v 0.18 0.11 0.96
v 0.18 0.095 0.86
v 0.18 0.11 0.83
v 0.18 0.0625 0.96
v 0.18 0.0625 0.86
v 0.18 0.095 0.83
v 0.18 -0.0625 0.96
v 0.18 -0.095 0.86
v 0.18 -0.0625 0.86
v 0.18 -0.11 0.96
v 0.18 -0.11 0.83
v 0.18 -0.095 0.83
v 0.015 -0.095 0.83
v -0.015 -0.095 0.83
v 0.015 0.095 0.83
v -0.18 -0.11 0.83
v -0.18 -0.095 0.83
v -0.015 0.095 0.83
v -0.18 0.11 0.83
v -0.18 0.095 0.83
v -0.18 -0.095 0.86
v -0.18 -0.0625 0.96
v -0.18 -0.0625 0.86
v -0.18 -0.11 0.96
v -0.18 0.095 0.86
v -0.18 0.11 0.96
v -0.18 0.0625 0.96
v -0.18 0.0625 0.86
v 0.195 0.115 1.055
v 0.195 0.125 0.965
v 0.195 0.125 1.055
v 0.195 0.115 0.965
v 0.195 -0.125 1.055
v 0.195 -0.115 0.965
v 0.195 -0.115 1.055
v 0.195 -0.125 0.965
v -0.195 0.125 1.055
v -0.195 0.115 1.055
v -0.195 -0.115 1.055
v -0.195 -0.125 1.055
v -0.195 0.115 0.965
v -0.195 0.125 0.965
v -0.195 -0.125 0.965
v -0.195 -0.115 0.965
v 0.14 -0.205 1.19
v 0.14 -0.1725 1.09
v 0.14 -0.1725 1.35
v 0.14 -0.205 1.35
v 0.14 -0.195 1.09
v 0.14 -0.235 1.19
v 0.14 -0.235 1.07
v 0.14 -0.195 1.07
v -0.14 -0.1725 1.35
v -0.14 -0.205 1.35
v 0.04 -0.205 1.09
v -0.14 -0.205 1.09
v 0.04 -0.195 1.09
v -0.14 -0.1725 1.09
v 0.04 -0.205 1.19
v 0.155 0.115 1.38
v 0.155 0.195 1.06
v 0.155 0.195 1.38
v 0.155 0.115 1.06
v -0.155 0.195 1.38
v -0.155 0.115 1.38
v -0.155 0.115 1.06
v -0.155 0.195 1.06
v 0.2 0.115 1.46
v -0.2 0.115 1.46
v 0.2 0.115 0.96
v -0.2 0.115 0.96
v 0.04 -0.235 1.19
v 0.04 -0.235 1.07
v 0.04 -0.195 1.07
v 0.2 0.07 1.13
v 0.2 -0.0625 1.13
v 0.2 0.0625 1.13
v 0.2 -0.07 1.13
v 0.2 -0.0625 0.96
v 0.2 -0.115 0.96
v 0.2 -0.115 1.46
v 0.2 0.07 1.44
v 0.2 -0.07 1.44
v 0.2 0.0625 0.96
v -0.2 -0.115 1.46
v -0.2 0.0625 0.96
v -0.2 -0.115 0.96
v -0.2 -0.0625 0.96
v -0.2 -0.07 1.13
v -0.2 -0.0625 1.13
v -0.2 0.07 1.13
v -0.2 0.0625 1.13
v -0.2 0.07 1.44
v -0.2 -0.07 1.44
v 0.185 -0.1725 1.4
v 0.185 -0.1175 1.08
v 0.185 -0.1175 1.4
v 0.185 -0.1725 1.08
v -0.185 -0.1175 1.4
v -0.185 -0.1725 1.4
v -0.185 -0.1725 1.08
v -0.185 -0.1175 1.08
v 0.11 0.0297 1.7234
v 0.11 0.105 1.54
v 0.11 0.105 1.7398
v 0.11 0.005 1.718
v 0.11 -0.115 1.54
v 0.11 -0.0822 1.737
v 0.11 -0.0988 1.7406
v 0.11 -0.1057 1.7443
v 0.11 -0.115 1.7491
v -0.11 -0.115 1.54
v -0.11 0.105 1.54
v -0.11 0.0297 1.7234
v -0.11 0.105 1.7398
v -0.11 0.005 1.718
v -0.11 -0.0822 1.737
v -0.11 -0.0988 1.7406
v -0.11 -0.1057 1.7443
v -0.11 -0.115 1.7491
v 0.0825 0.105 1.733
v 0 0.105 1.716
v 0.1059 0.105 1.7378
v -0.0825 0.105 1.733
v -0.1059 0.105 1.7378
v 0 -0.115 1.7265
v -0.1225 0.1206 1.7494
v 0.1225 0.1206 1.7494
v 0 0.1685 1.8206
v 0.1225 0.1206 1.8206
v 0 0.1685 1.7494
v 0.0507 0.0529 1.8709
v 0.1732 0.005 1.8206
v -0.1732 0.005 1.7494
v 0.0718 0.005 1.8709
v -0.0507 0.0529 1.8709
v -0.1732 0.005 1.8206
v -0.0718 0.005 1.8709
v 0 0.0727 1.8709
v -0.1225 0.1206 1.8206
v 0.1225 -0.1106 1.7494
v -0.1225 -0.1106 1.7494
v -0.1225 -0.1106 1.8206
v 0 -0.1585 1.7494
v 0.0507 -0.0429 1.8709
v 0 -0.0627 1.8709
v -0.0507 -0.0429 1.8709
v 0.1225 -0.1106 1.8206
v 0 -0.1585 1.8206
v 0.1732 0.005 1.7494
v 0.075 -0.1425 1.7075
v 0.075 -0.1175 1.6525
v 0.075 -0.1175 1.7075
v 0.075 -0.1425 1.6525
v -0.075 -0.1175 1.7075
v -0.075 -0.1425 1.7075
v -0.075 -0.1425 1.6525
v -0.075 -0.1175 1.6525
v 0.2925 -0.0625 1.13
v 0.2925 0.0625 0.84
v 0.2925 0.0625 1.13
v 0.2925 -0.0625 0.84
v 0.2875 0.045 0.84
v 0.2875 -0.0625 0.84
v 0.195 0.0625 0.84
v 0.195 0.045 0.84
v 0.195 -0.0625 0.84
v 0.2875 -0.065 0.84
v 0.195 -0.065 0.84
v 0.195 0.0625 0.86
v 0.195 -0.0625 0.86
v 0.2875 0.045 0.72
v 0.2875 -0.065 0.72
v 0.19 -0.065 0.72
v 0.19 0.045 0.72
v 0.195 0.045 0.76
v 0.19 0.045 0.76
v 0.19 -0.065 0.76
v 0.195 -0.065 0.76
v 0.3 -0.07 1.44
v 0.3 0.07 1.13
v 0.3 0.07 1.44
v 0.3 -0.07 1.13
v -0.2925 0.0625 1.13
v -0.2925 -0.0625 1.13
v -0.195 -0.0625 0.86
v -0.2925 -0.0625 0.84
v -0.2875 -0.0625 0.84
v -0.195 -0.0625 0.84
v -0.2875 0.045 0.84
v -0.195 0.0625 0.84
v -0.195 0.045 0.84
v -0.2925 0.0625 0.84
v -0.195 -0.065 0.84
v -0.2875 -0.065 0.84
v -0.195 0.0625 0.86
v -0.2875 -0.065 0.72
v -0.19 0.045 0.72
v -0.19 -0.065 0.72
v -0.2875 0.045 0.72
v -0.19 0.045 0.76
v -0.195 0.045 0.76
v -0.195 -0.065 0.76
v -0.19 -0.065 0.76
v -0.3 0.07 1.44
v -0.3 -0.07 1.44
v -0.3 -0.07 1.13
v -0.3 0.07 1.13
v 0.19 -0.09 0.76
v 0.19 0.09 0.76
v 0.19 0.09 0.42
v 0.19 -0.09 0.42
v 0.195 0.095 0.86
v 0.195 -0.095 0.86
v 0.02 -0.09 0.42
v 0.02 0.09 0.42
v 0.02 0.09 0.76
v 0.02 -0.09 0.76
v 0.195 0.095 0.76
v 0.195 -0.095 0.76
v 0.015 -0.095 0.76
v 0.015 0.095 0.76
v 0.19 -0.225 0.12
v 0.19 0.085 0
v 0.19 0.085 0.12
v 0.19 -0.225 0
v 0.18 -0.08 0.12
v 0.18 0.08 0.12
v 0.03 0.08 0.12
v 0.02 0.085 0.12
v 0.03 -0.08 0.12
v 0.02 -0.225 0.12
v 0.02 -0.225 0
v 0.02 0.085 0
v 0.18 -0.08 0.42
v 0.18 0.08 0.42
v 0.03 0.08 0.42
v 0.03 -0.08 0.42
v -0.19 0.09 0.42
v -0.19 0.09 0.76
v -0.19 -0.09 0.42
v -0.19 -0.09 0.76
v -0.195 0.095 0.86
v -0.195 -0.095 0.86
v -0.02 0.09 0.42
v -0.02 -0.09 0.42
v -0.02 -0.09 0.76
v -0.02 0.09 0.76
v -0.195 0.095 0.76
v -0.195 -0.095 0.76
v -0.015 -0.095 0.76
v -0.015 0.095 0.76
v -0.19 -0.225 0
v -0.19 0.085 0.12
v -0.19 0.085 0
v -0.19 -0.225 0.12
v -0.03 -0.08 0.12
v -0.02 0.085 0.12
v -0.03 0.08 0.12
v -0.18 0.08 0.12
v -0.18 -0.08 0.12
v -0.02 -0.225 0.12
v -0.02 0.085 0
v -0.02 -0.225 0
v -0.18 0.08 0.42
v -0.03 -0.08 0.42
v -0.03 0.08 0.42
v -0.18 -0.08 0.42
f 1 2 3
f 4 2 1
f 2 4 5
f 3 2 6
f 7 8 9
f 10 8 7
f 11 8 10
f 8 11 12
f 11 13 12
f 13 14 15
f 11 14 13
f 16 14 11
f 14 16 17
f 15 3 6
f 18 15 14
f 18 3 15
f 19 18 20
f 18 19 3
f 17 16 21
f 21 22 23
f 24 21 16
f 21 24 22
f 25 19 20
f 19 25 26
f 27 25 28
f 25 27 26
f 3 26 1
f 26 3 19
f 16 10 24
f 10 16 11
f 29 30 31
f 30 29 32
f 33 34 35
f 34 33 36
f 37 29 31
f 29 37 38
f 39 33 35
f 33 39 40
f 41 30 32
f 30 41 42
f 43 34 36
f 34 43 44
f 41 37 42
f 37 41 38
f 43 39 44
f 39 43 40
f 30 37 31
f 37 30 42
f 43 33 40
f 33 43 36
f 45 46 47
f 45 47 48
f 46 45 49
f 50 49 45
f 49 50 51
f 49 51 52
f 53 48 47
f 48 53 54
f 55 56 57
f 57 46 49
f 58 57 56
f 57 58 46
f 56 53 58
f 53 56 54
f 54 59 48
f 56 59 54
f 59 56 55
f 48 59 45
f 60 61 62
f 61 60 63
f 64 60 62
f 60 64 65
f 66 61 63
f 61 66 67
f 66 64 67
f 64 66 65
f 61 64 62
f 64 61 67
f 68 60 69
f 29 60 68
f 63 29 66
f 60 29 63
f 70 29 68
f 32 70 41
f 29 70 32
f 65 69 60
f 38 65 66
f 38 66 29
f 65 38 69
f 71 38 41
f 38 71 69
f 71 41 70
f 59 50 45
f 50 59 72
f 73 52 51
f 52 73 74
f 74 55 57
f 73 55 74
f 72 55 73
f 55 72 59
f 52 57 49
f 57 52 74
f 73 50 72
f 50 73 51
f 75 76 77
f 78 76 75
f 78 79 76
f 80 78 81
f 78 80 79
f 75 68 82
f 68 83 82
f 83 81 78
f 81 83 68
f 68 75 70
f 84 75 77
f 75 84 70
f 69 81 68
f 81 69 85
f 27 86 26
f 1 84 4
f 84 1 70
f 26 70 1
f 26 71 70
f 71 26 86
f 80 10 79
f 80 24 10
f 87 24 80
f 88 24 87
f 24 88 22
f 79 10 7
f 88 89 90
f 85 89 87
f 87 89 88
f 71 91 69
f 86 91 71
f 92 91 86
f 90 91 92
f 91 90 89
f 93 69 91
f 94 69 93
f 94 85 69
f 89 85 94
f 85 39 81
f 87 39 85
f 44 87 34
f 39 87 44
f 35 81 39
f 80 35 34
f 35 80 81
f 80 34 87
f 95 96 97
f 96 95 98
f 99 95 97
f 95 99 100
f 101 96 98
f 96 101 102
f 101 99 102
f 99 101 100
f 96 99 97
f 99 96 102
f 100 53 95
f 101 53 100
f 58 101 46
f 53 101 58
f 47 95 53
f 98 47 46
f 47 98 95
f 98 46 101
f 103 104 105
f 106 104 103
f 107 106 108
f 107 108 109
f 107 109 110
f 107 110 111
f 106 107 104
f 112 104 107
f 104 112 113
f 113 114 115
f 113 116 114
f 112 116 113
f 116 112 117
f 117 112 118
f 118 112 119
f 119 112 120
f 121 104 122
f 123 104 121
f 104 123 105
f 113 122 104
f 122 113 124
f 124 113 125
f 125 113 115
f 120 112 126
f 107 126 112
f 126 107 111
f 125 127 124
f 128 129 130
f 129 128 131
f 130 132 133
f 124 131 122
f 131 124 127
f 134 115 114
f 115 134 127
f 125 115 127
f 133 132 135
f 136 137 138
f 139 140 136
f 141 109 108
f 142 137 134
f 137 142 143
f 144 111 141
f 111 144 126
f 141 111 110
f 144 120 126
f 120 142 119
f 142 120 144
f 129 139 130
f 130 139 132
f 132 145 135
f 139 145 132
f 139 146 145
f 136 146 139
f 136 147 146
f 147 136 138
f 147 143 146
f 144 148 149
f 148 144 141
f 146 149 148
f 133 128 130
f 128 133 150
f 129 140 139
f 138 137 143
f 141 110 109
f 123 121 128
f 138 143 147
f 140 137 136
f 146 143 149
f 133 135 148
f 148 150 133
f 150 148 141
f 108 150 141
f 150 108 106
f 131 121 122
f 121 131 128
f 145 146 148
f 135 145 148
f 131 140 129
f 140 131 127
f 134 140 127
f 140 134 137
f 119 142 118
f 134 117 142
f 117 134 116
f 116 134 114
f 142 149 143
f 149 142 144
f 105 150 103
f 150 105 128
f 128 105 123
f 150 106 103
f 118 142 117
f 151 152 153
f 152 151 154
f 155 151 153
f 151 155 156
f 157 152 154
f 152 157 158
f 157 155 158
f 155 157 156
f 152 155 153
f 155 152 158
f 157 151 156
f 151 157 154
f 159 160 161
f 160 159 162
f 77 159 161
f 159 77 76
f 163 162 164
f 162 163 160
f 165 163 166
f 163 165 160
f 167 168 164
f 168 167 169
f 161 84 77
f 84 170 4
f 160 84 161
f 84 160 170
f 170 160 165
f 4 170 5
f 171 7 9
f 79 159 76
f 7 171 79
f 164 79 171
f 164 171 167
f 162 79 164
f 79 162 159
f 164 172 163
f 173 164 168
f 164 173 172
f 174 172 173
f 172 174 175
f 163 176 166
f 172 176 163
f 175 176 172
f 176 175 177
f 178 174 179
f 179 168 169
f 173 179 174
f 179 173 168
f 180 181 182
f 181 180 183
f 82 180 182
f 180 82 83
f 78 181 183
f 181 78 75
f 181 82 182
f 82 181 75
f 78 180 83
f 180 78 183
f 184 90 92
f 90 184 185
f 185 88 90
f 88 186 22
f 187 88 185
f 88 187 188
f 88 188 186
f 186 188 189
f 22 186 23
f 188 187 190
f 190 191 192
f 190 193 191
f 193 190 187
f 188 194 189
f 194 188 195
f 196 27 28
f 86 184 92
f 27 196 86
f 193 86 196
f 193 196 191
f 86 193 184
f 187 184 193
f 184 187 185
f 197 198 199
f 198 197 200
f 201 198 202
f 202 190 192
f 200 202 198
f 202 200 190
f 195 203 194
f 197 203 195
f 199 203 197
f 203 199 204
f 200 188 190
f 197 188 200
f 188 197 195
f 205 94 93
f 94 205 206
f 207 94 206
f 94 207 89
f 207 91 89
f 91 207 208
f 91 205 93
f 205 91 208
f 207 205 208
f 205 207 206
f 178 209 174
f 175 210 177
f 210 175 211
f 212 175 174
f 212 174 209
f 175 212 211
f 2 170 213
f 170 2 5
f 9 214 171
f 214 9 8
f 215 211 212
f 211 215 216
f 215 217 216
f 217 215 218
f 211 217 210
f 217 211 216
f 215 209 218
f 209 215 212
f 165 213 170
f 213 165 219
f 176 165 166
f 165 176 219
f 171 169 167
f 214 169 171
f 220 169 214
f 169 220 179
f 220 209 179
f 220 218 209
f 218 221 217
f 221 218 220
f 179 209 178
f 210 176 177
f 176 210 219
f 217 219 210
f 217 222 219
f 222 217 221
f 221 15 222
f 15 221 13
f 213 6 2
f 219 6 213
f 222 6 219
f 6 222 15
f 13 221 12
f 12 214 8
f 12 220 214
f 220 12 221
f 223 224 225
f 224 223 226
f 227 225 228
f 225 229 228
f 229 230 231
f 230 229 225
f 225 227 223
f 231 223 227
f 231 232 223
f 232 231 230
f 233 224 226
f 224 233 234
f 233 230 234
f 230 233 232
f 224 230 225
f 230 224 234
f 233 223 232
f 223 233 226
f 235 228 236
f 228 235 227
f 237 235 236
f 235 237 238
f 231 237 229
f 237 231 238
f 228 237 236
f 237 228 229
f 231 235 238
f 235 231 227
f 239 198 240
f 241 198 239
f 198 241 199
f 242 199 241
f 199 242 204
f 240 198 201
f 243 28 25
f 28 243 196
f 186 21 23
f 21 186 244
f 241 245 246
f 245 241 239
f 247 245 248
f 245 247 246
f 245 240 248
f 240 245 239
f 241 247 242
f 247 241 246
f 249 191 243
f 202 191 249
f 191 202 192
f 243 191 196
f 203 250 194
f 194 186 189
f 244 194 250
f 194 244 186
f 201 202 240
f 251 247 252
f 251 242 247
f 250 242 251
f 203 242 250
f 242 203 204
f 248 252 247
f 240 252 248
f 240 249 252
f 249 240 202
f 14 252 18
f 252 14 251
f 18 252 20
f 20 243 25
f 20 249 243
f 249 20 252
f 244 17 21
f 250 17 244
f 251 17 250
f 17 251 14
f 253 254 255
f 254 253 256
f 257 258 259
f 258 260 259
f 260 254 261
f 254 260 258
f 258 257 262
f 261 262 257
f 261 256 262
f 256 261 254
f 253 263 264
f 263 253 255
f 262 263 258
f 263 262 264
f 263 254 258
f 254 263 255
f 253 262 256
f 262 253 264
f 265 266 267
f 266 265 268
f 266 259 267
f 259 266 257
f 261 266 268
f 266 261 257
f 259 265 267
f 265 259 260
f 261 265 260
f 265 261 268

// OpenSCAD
// ============================================================================
// nextdayz_survivor.scad - Articulated rigid-body player for NextDayz 3C.
//
// ScadRig: 1 unit = 1 metre, Z-up, faces -Y, bone_root at ground. The
// character's RIGHT side is -X: the _r bones (firing hand, rear foot) sit at
// -X so the rifle shoulders on the same side the over-the-shoulder camera
// looks past.
//
// Every clip below is generated by rig_humanoid.scad from intent, not typed in
// as joint angles: gaits from cadence / speed / duty / bob / sway with the
// boots IK-planted on z = 0, weapon holds from a weapon frame in chest space
// with both arms IK-solved onto the grip and handguard. Tune the numbers in
// the dictionaries; the loader still sees ordinary anim_* data.
//
// Runtime contract (NextDayz PlayerRigVisual):
//   bone_ik_weapon      weapon frame (muzzle -Y), child of the torso. Hold
//                       clips animate it; the game re-solves the arms onto it
//                       every frame after adding aim pitch, sway and recoil.
//   bone_ik_hand_r/l    wrist frames on the grip / handguard (weapon space).
//   bone_weapon_socket  weapon attachment under the right hand; its bind is
//                       the inverse of the right grip, so a hand solved onto
//                       bone_ik_hand_r puts the weapon exactly on the frame.
// Locomotion is in-place; the Jolt character controller owns translation.
// ============================================================================

use <../lib/rig_humanoid.scad>

$fn = 8;

ROLECOLOR = [1.00, 0.00, 1.00];
UNIFORM   = [0.22, 0.25, 0.22];
VEST      = [0.12, 0.14, 0.12];
SKIN      = [0.72, 0.52, 0.38];
BOOT      = [0.07, 0.065, 0.06];
METAL     = [0.18, 0.19, 0.18];

// --- Skeleton ----------------------------------------------------------------
// Must match the bone_* translations below; the clip generators read it.

SKEL = rh_skeleton([
    ["pelvis_z", 0.94],
    ["hip", [0.105, 0, -0.08]],
    ["thigh", 0.44],
    ["calf", 0.42],
    ["heel", 0.085],
    ["ball", 0.21],
    ["torso_z", 0.02],
    ["shoulder", [0.235, 0, 0.48]],
    ["upperarm", 0.31],
    ["forearm", 0.29]
]);

// --- Weapon hold ---------------------------------------------------------------
// Weapon frame = the weapon model origin; muzzle -Y, top +Z. The rifle stock
// butt sits STOCK behind it. Holds are built from the shoulder pocket so the
// butt stays in the firing-side shoulder whatever the blade and pitch.

POCKET = [-0.14, -0.12, 0.42];
STOCK  = 0.34;

// Right wrist on the grip (inverse of the socket below) and left wrist under
// the handguard, both in weapon space.
GRIP_R = [[0, 0.0837, 0.0547], [-20, 0, 0]];
GRIP_L = [[0.045, -0.20, -0.075], [-160, -30, 0]];

// blade: torso yaw away from the target (right shoulder back), cancelled in
// the weapon frame so the muzzle stays on the body axis. pitch: + = muzzle down.
function nd_shoulder_hold(blade, pitch, pocket = POCKET, inward = 5) =
    let(e = [pitch, 0, blade + inward])
    [pocket - rh_mv(rh_m(e), [0, STOCK, 0]), e];

READY_BLADE = 20;
AIM_BLADE   = 30;
HOLD_READY  = nd_shoulder_hold(READY_BLADE, 14);
HOLD_AIM    = nd_shoulder_hold(AIM_BLADE, 0, [-0.13, -0.12, 0.47]);
HOLD_UP     = nd_shoulder_hold(AIM_BLADE, -38, [-0.13, -0.11, 0.48]);
HOLD_DOWN   = nd_shoulder_hold(AIM_BLADE, 38, [-0.13, -0.14, 0.44]);
// Sprint: rifle across the chest, muzzle up toward the support shoulder.
HOLD_SPRINT = [[0.0, -0.30, 0.30], [-50, 0, 45]];
// Lowered to the firing side, muzzle down (switching, traversal, looting).
HOLD_LOW    = [[-0.24, -0.22, 0.14], [68, 0, -18]];

RIG = [
    ["weapon_bind", HOLD_READY],
    ["grip_r", GRIP_R],
    ["grip_l", GRIP_L],
    ["pole_r", [-0.50, 0.08, 0.12]],
    ["pole_l", [0.45, -0.15, 0.08]]
];

// --- Parts -------------------------------------------------------------------

module part_pelvis()
{
    color(UNIFORM) cube([0.36, 0.22, 0.22], center = true);
    color(VEST) translate([0, 0, 0.07]) cube([0.39, 0.25, 0.09], center = true);
}

module part_torso()
{
    color(UNIFORM) translate([0, 0, 0.25]) cube([0.40, 0.23, 0.50], center = true);
    color(ROLECOLOR) translate([0, -0.145, 0.28]) cube([0.37, 0.055, 0.32], center = true);
    color(VEST)
    {
        translate([0, -0.18, 0.26]) cube([0.28, 0.05, 0.26], center = true);
        translate([0, 0.155, 0.26]) cube([0.31, 0.08, 0.32], center = true);
        // Magazine pouches on the support side of the plate carrier.
        translate([0.09, -0.215, 0.17]) cube([0.10, 0.04, 0.12], center = true);
    }
}

module part_head()
{
    color(SKIN) translate([0, -0.005, 0.12]) cube([0.22, 0.22, 0.24], center = true);
    color(ROLECOLOR) translate([0, 0.005, 0.245]) scale([1.25, 1.18, 0.62]) sphere(r = 0.15);
    color(METAL) translate([0, -0.13, 0.14]) cube([0.15, 0.025, 0.055], center = true);
}

module part_upperarm()
{
    color(ROLECOLOR) translate([0, 0, -0.155]) cube([0.13, 0.14, 0.31], center = true);
}

module part_forearm()
{
    color(UNIFORM) translate([0, 0, -0.145]) cube([0.115, 0.125, 0.29], center = true);
}

module part_hand()
{
    color(SKIN) translate([0, -0.01, -0.06]) cube([0.105, 0.11, 0.12], center = true);
}

module part_thigh()
{
    color(UNIFORM) translate([0, 0, -0.22]) cube([0.17, 0.18, 0.44], center = true);
    color(VEST) translate([0, 0, -0.05]) cube([0.18, 0.19, 0.10], center = true);
}

module part_calf()
{
    color(UNIFORM) translate([0, 0, -0.21]) cube([0.15, 0.16, 0.42], center = true);
}

module part_foot()
{
    color(BOOT) translate([0, -0.07, 0.06]) cube([0.17, 0.31, 0.12], center = true);
    color(ROLECOLOR) translate([0, -0.20, 0.07]) cube([0.11, 0.045, 0.06], center = true);
}

// --- Bones -------------------------------------------------------------------

module bone_weapon_socket()
{
    // Empty on purpose: the runtime weapon hangs here. Local -Y is the muzzle.
}

module bone_ik_hand_r() {}
module bone_ik_hand_l() {}

module bone_ik_weapon()
{
    translate(GRIP_R[0]) rotate(GRIP_R[1]) bone_ik_hand_r();
    translate(GRIP_L[0]) rotate(GRIP_L[1]) bone_ik_hand_l();
}

module bone_hand_l() { part_hand(); }
module bone_hand_r()
{
    mirror([1, 0, 0]) part_hand();
    translate([0, -0.06, -0.08]) rotate([20, 0, 0]) bone_weapon_socket();
}

module bone_forearm_l()
{
    part_forearm();
    translate([0, 0, -0.29]) bone_hand_l();
}
module bone_forearm_r()
{
    mirror([1, 0, 0]) part_forearm();
    translate([0, 0, -0.29]) bone_hand_r();
}

module bone_upperarm_l()
{
    part_upperarm();
    translate([0, 0, -0.31]) bone_forearm_l();
}
module bone_upperarm_r()
{
    mirror([1, 0, 0]) part_upperarm();
    translate([0, 0, -0.31]) bone_forearm_r();
}

module bone_head() { part_head(); }

module bone_torso()
{
    part_torso();
    translate([0, 0, 0.58]) bone_head();
    translate([ 0.235, 0, 0.48]) bone_upperarm_l();
    translate([-0.235, 0, 0.48]) bone_upperarm_r();
    translate(HOLD_READY[0]) rotate(HOLD_READY[1]) bone_ik_weapon();
}

module bone_foot_l() { part_foot(); }
module bone_foot_r() { mirror([1, 0, 0]) part_foot(); }

module bone_calf_l()
{
    part_calf();
    translate([0, 0, -0.42]) bone_foot_l();
}
module bone_calf_r()
{
    mirror([1, 0, 0]) part_calf();
    translate([0, 0, -0.42]) bone_foot_r();
}

module bone_thigh_l()
{
    part_thigh();
    translate([0, 0, -0.44]) bone_calf_l();
}
module bone_thigh_r()
{
    mirror([1, 0, 0]) part_thigh();
    translate([0, 0, -0.44]) bone_calf_r();
}

module bone_pelvis()
{
    part_pelvis();
    translate([0, 0, 0.02]) bone_torso();
    translate([ 0.105, 0, -0.08]) bone_thigh_l();
    translate([-0.105, 0, -0.08]) bone_thigh_r();
}

module bone_root()
{
    translate([0, 0, 0.94]) bone_pelvis();
}

bone_root();

// --- Gaits ---------------------------------------------------------------------
// cycle/speed/duty fix the stride (stance sweep = speed * duty * cycle); the
// rest is body language. stride_bias shifts the sweep back so the boot lands
// under the knee and toes off far behind, as a real stride does.

GAIT_COMMON = [
    ["keys", 32], ["head_level", 0.85], ["gaze_pitch", -2]
];

GAIT_WALK = rh_gait_params(concat(GAIT_COMMON, [
    ["cycle", 0.84], ["speed", 1.8], ["duty", 0.60], ["stride_bias", 0.08],
    ["step_height", 0.09], ["lift_skew", 0.85], ["swing_tangent", 0.25], ["swing_out", 0.02],
    ["heel_strike", 14], ["heel_until", 0.18], ["toe_off", 42], ["toe_from", 0.55], ["swing_pitch", 14],
    ["width", 0.11], ["pelvis", [0, 0, -0.075]], ["bob", 0.016], ["bob_sign", 1], ["sway", 0.022],
    ["hip_pitch", 3], ["hip_yaw", 6], ["hip_roll", 3], ["strafe_turn", 35],
    ["torso_lean", 4], ["torso_bounce", 0.8], ["torso_counter", 1.3], ["strafe_lean", 3],
    ["arm_base", 6], ["arm_swing", 18], ["arm_out", 6], ["elbow_base", 20], ["elbow_swing", 15]
]));

GAIT_RUN = rh_gait_params(concat(GAIT_COMMON, [
    ["cycle", 0.68], ["speed", 4.2], ["duty", 0.33], ["stride_bias", 0.12],
    ["step_height", 0.17], ["lift_skew", 0.6], ["swing_tangent", 0.35], ["swing_out", 0.02],
    ["heel_strike", 6], ["heel_until", 0.10], ["toe_off", 58], ["toe_from", 0.45], ["swing_pitch", 35],
    ["width", 0.09], ["pelvis", [0, -0.02, -0.10]], ["bob", 0.032], ["bob_sign", -1], ["sway", 0.012],
    ["hip_pitch", 6], ["hip_yaw", 9], ["hip_roll", 4], ["strafe_turn", 45],
    ["torso_lean", 7], ["torso_bounce", 2], ["torso_counter", 1.3], ["strafe_lean", 6],
    ["arm_base", 10], ["arm_swing", 35], ["arm_out", 8], ["elbow_base", 75], ["elbow_swing", 25]
]));

GAIT_SPRINT = rh_gait_params(concat(GAIT_COMMON, [
    ["cycle", 0.58], ["speed", 7.6], ["duty", 0.24], ["stride_bias", 0.15],
    ["step_height", 0.24], ["lift_skew", 0.55], ["swing_tangent", 0.40], ["swing_out", 0.01],
    ["heel_strike", 0], ["heel_until", 0], ["toe_off", 62], ["toe_from", 0.40], ["swing_pitch", 45],
    ["width", 0.07], ["pelvis", [0, -0.04, -0.11]], ["bob", 0.04], ["bob_sign", -1], ["sway", 0.008],
    ["hip_pitch", 10], ["hip_yaw", 12], ["hip_roll", 3], ["strafe_turn", 50],
    ["torso_lean", 14], ["torso_bounce", 2.5], ["torso_counter", 1.3], ["strafe_lean", 8],
    ["arm_base", 12], ["arm_swing", 55], ["arm_out", 6], ["elbow_base", 90], ["elbow_swing", 20]
]));

GAIT_CROUCH = rh_gait_params(concat(GAIT_COMMON, [
    ["cycle", 0.80], ["speed", 1.55], ["duty", 0.62], ["stride_bias", 0.05],
    ["step_height", 0.07], ["lift_skew", 0.9], ["swing_tangent", 0.2], ["swing_out", 0.03],
    ["heel_strike", 8], ["heel_until", 0.15], ["toe_off", 35], ["toe_from", 0.6], ["swing_pitch", 10],
    ["width", 0.14], ["pelvis", [0, 0.08, -0.33]], ["bob", 0.012], ["bob_sign", 1], ["sway", 0.03],
    ["hip_pitch", 12], ["hip_yaw", 5], ["hip_roll", 2], ["strafe_turn", 35],
    ["torso_lean", 14], ["torso_bounce", 0.6], ["torso_counter", 1.3], ["strafe_lean", 3],
    ["arm_base", 18], ["arm_swing", 10], ["arm_out", 10], ["elbow_base", 45], ["elbow_swing", 10]
]));

anim_stand_walk_f = rh_gait_clip(SKEL, GAIT_WALK, 0);
anim_stand_walk_b = rh_gait_clip(SKEL, GAIT_WALK, 180);
anim_stand_walk_l = rh_gait_clip(SKEL, GAIT_WALK, 90);
anim_stand_walk_r = rh_gait_clip(SKEL, GAIT_WALK, -90);

anim_stand_run_f = rh_gait_clip(SKEL, GAIT_RUN, 0);
anim_stand_run_b = rh_gait_clip(SKEL, GAIT_RUN, 180);
anim_stand_run_l = rh_gait_clip(SKEL, GAIT_RUN, 90);
anim_stand_run_r = rh_gait_clip(SKEL, GAIT_RUN, -90);

anim_stand_sprint_f = rh_gait_clip(SKEL, GAIT_SPRINT, 0);
anim_stand_sprint_b = rh_gait_clip(SKEL, GAIT_SPRINT, 180);
anim_stand_sprint_l = rh_gait_clip(SKEL, GAIT_SPRINT, 90);
anim_stand_sprint_r = rh_gait_clip(SKEL, GAIT_SPRINT, -90);

anim_crouch_walk_f = rh_gait_clip(SKEL, GAIT_CROUCH, 0);
anim_crouch_walk_b = rh_gait_clip(SKEL, GAIT_CROUCH, 180);
anim_crouch_walk_l = rh_gait_clip(SKEL, GAIT_CROUCH, 90);
anim_crouch_walk_r = rh_gait_clip(SKEL, GAIT_CROUCH, -90);

// --- Stances -------------------------------------------------------------------
// Staggered fighting stance: support foot forward, firing foot back and turned
// out, knees soft, weight forward. A slow breath keeps it alive.

function nd_level_head(pelvisRot, torsoRot, gaze = [-2, 0, 0]) =
    [gaze[0] - (pelvisRot[0] + torsoRot[0]) * 0.85,
     gaze[1] - (pelvisRot[1] + torsoRot[1]) * 0.85,
     gaze[2] - (pelvisRot[2] + torsoRot[2]) * 0.85];

function nd_breath_key(base, phase, depth) =
    let(b = sin(360 * phase),
        pelvisPos = rh_get(base, "pelvis") + [0, 0, -0.006 * b * depth],
        pelvisRot = rh_get(base, "pelvis_rot"),
        torsoRot = rh_get(base, "torso") + [1.2 * b * depth, 0, 0.4 * b * depth])
    concat([["pelvis", pelvisPos], ["pelvis_rot", pelvisRot], ["torso", torsoRot],
            ["head", nd_level_head(pelvisRot, torsoRot)]], base);

function nd_breath_clip(base, cycle, depth) =
    rh_clip_from_poses(concat(rh_lower_bones(), [["bone_torso", "rot"], ["bone_head", "rot"]],
                              [["bone_upperarm_l", "rot"], ["bone_forearm_l", "rot"],
                               ["bone_upperarm_r", "rot"], ["bone_forearm_r", "rot"]]),
                       [for (i = [0 : 8]) cycle * i / 8],
                       [for (i = [0 : 8])
                           let(key = nd_breath_key(base, i / 8, depth))
                           concat(rh_lower_pose(SKEL, key), [rh_get(key, "torso"), rh_get(key, "head")],
                                  rh_get(base, "arms"))],
                       true);

STAND_BASE = [
    ["pelvis", [0, 0.02, -0.06]], ["pelvis_rot", [3, 0, -10]], ["torso", [5, 0, 8]],
    ["foot_l", [0.13, -0.08, 12, 0]], ["foot_r", [-0.15, 0.17, -28, 0]],
    ["arms", [[-8, -6, 0], [-22, 0, 0], [-6, 6, 0], [-18, 0, 0]]]
];

CROUCH_BASE = [
    ["pelvis", [0, 0.10, -0.40]], ["pelvis_rot", [10, 0, -12]], ["torso", [20, 0, 10]],
    ["foot_l", [0.14, -0.22, 14, 0]], ["foot_r", [-0.16, 0.20, -26, 42]],
    ["arms", [[-24, -10, 0], [-48, 0, 0], [-20, 10, 0], [-46, 0, 0]]]
];

anim_stand_idle  = nd_breath_clip(STAND_BASE, 3.2, 1.0);
anim_crouch_idle = nd_breath_clip(CROUCH_BASE, 2.8, 0.8);

// --- Weapon holds (upper body) -------------------------------------------------
// Torso/head carry the blade; layered additively over locomotion at runtime.

function nd_hold(weapon, blade, extra = []) =
    concat(extra, [["weapon", weapon], ["torso", [0, 0, -blade]], ["head", [0, 0, blade * 0.9]]]);

anim_weapon_ready     = rh_upper_clip(SKEL, RIG, [[0, nd_hold(HOLD_READY, READY_BLADE)]], true);
anim_aim_rifle_center = rh_upper_clip(SKEL, RIG, [[0, nd_hold(HOLD_AIM, AIM_BLADE,
                                                       [["head", [6, -8, AIM_BLADE * 0.9]]])]], true);
anim_aim_rifle_up     = rh_upper_clip(SKEL, RIG, [[0, nd_hold(HOLD_UP, AIM_BLADE,
                                                       [["torso", [-10, 0, -AIM_BLADE]],
                                                        ["head", [-14, -8, AIM_BLADE * 0.9]]])]], true);
anim_aim_rifle_down   = rh_upper_clip(SKEL, RIG, [[0, nd_hold(HOLD_DOWN, AIM_BLADE,
                                                       [["torso", [12, 0, -AIM_BLADE]],
                                                        ["head", [22, -8, AIM_BLADE * 0.9]]])]], true);
anim_weapon_sprint    = rh_upper_clip(SKEL, RIG, [[0, [["weapon", HOLD_SPRINT], ["torso", [0, 0, 6]],
                                                       ["head", [0, 0, -5]]]]], true);
anim_weapon_low       = rh_upper_clip(SKEL, RIG, [[0, [["weapon", HOLD_LOW], ["torso", [0, 0, -6]],
                                                       ["head", [0, 0, 5]]]]], true);

// Melee has its own relaxed carry, raised guard and committed attack. The
// support hand guards the chest for one-handed weapons; the axe uses both
// hands on its haft. Contact times are normalized (WeaponDefs.hpp).
function nd_melee_key(weapon, body = [0, 0, 0], twoHands = false) =
    let(guard = [[0.20, -0.23, 0.34], [-25, 0, -15]],
        guardLocal = rh_fx(rh_finv(rh_frame(weapon[0], weapon[1])), rh_frame(guard[0], guard[1])),
        support = twoHands ? [[0, -0.035, 0.015], [-160, 0, 0]] : [guardLocal[0], rh_e(guardLocal[1])])
    [["weapon", weapon], ["torso", body],
     ["head", [-body[0] * 0.6, -body[1] * 0.6, -body[2] * 0.8]],
     ["hand_l", support]];

KNIFE_LOW = [[-0.28, -0.18, 0.12], [55, 0, -12]];
KNIFE_GUARD = [[-0.27, -0.28, 0.34], [-12, 0, -15]];
BAR_LOW = [[-0.29, -0.18, 0.15], [60, 0, -12]];
BAR_GUARD = [[-0.28, -0.26, 0.34], [-65, 0, -25]];
AXE_LOW = [[-0.22, -0.26, 0.17], [45, 0, -12]];
AXE_GUARD = [[-0.22, -0.29, 0.36], [-55, 0, -15]];

anim_melee_knife_low = rh_upper_clip(SKEL, RIG, [[0, nd_melee_key(KNIFE_LOW)]], true);
anim_melee_knife_ready = rh_upper_clip(SKEL, RIG, [[0, nd_melee_key(KNIFE_GUARD, [0, 0, -12])]], true);
anim_melee_crowbar_low = rh_upper_clip(SKEL, RIG, [[0, nd_melee_key(BAR_LOW)]], true);
anim_melee_crowbar_ready = rh_upper_clip(SKEL, RIG, [[0, nd_melee_key(BAR_GUARD, [0, 0, -16])]], true);
anim_melee_axe_low = rh_upper_clip(SKEL, RIG, [[0, nd_melee_key(AXE_LOW, [0, 0, 0], true)]], true);
anim_melee_axe_ready = rh_upper_clip(SKEL, RIG, [[0, nd_melee_key(AXE_GUARD, [0, 0, -12], true)]], true);

// Knife: pull the elbow back, thrust forward, withdraw to guard.
anim_melee_knife_attack = rh_upper_clip(SKEL, RIG, [
    [0.00, nd_melee_key(KNIFE_GUARD, [0, 0, -12])],
    [0.23, nd_melee_key([[-0.32, -0.16, 0.34], [-5, 0, -28]], [-3, 0, -22])],
    [0.38, nd_melee_key([[-0.15, -0.50, 0.35], [0, 0, 8]], [8, 0, 12])],
    [0.54, nd_melee_key([[-0.12, -0.45, 0.28], [10, 0, 12]], [6, 0, 8])],
    [1.00, nd_melee_key(KNIFE_GUARD, [0, 0, -12])]
], false);

// Crowbar: shoulder-led horizontal sweep, with a visible follow-through.
anim_melee_crowbar_attack = rh_upper_clip(SKEL, RIG, [
    [0.00, nd_melee_key(BAR_GUARD, [0, 0, -16])],
    [0.25, nd_melee_key([[-0.34, -0.14, 0.40], [-85, 0, -55]], [-5, 0, -30])],
    [0.42, nd_melee_key([[-0.08, -0.43, 0.34], [-5, 0, 12]], [6, 0, 16])],
    [0.58, nd_melee_key([[0.06, -0.32, 0.25], [18, 0, 65]], [10, 0, 28])],
    [1.00, nd_melee_key(BAR_GUARD, [0, 0, -16])]
], false);

// Axe: lift above the shoulder, drive down, recover the heavy head.
anim_melee_axe_attack = rh_upper_clip(SKEL, RIG, [
    [0.00, nd_melee_key(AXE_GUARD, [0, 0, -12], true)],
    [0.26, nd_melee_key([[-0.24, -0.17, 0.51], [-115, 0, -25]], [-10, 0, -24], true)],
    [0.43, nd_melee_key([[-0.13, -0.45, 0.29], [15, 0, 10]], [12, 0, 12], true)],
    [0.59, nd_melee_key([[-0.04, -0.35, 0.16], [60, 0, 30]], [18, 0, 22], true)],
    [1.00, nd_melee_key(AXE_GUARD, [0, 0, -12], true)]
], false);

// Reload: cant the rifle, strip the magazine, fetch a fresh one from the
// support-side pouch, seat it, rack the bolt. Left wrist targets are in weapon
// space so the hand rides the rifle as it moves.
HOLD_RELOAD = [[-0.06, -0.40, 0.30], [-6, -32, 20]];
anim_reload_rifle = rh_upper_clip(SKEL, RIG, [
    [0.00, nd_hold(HOLD_READY, READY_BLADE)],
    [0.25, nd_hold(HOLD_RELOAD, 12, [["hand_l", [[0.06, -0.07, -0.20], [-150, -20, 0]]], ["head", [16, 0, 10]]])],
    [0.55, nd_hold(HOLD_RELOAD, 12, [["hand_l", [[0.10, -0.02, -0.40], [-170, -10, 0]]], ["head", [18, 0, 10]]])],
    [0.85, nd_hold(HOLD_RELOAD, 12, [["hand_l", [[0.22, 0.10, -0.32], [-170, 0, 20]]], ["head", [14, 0, 12]]])],
    [1.25, nd_hold(HOLD_RELOAD, 12, [["hand_l", [[0.08, -0.04, -0.34], [-160, -15, 0]]], ["head", [18, 0, 10]]])],
    [1.55, nd_hold([[-0.06, -0.40, 0.31], [-8, -32, 20]], 12,
                   [["hand_l", [[0.06, -0.06, -0.19], [-150, -20, 0]]], ["head", [16, 0, 10]]])],
    [1.85, nd_hold(HOLD_RELOAD, 12, [["hand_l", [[-0.05, 0.03, 0.05], [-200, 20, 0]]], ["head", [12, 0, 10]]])],
    [2.20, nd_hold(HOLD_READY, READY_BLADE)]
], false);

anim_switch_weapon = rh_upper_clip(SKEL, RIG, [
    [0.00, nd_hold(HOLD_READY, READY_BLADE)],
    [0.38, [["weapon", HOLD_LOW], ["torso", [4, 0, 6]], ["head", [6, 0, -4]],
            ["hand_l", [[0.30, 0.10, 0.10], [-20, 0, 0]]]]],
    [0.52, [["weapon", HOLD_LOW], ["torso", [4, 0, 6]], ["head", [6, 0, -4]],
            ["hand_l", [[0.30, 0.10, 0.10], [-20, 0, 0]]]]],
    [0.90, nd_hold(HOLD_READY, READY_BLADE)]
], false);

// Additive kick: starts and ends at identity so it can be retriggered per shot.
anim_recoil_rifle = [
    ["loop", false],
    ["bone_torso", "rot", [[0, [0, 0, 0]], [0.04, [-3.5, 0, -1.2]], [0.11, [-1.0, 0, -0.3]],
                           [0.15, [0.6, 0, 0.2]], [0.2, [0, 0, 0]]]],
    ["bone_head", "rot", [[0, [0, 0, 0]], [0.04, [-2.0, 0, 0]], [0.11, [-0.5, 0, 0]], [0.15, [0.3, 0, 0]],
                          [0.2, [0, 0, 0]]]],
    ["bone_ik_weapon", "pos", [[0, [0, 0, 0]], [0.04, [0, 0.035, 0.008]], [0.11, [0, 0.010, 0.003]],
                               [0.15, [0, -0.004, 0]], [0.2, [0, 0, 0]]]],
    ["bone_ik_weapon", "rot", [[0, [0, 0, 0]], [0.04, [-4.5, 0, 1.0]], [0.11, [-1.2, 0, 0.3]],
                               [0.15, [0.5, 0, 0]], [0.2, [0, 0, 0]]]]
];

// --- Airborne ------------------------------------------------------------------

// Full-body clips hold the rifle square (no blade): at runtime the hold layers
// add the blade on top, exactly as they do over locomotion.
HOLD_SQUARE = nd_shoulder_hold(0, 14);

function nd_air_key(pelvis, pelvisRot, torso, footL, footR) =
    [["pelvis", pelvis], ["pelvis_rot", pelvisRot], ["torso", torso],
     ["head", nd_level_head(pelvisRot, torso)], ["foot_l", footL], ["foot_r", footR],
     ["weapon", HOLD_SQUARE]];

anim_jump_up = rh_body_clip(SKEL, RIG, [
    [0.00, nd_air_key([0, 0.05, -0.17], [6, 0, -8], [12, 0, 6], [0.12, -0.06, 10, 0], [-0.13, 0.14, -24, 0])],
    [0.12, nd_air_key([0, 0.02, -0.06], [2, 0, -6], [6, 0, 6], [0.12, -0.04, 10, 30], [-0.12, 0.12, -20, 35])],
    [0.24, nd_air_key([0, -0.01, 0.03], [-2, 0, -4], [-2, 0, 6], [0.11, -0.10, 8, 30, 0.10],
                      [-0.11, 0.10, -16, 40, 0.16])]
], false);

anim_jump_air_loop = rh_body_clip(SKEL, RIG, [
    [0.0, nd_air_key([0, -0.01, 0.04], [-2, 0, -4], [-4, 0, 6], [0.11, -0.16, 8, 18, 0.24], [-0.11, 0.12, -14, 34, 0.32])],
    [0.3, nd_air_key([0, -0.01, 0.05], [-1, 0, -4], [-2, 0, 6], [0.11, -0.18, 8, 14, 0.27], [-0.11, 0.10, -14, 30, 0.34])],
    [0.6, nd_air_key([0, -0.01, 0.04], [-2, 0, -4], [-4, 0, 6], [0.11, -0.16, 8, 18, 0.24], [-0.11, 0.12, -14, 34, 0.32])]
], true);

anim_jump_down = rh_body_clip(SKEL, RIG, [
    [0.00, nd_air_key([0, -0.01, 0.02], [-1, 0, -4], [-2, 0, 6], [0.12, -0.10, 10, -6, 0.04], [-0.12, 0.12, -20, 10, 0.06])],
    [0.10, nd_air_key([0, 0.08, -0.24], [8, 0, -8], [20, 0, 6], [0.13, -0.08, 12, 0], [-0.14, 0.16, -26, 0])],
    [0.20, nd_air_key([0, 0.05, -0.14], [5, 0, -9], [12, 0, 7], [0.13, -0.08, 12, 0], [-0.15, 0.17, -28, 0])],
    [0.32, nd_air_key([0, 0.02, -0.06], [3, 0, -10], [5, 0, 8], [0.13, -0.08, 12, 0], [-0.15, 0.17, -28, 0])]
], false);

// --- Traversal -----------------------------------------------------------------
// Support hand plants on the obstacle top while the rifle stays low in the
// firing hand; the runtime releases the support arm from the rifle here.

function nd_trav_key(pelvis, pelvisRot, torso, footL, footR, handRoot) =
    concat([["pelvis", pelvis], ["pelvis_rot", pelvisRot], ["torso", torso],
            ["head", nd_level_head(pelvisRot, torso, [-6, 0, 0])], ["foot_l", footL], ["foot_r", footR],
            ["weapon", HOLD_LOW]],
           handRoot == undef ? [] : [["hand_l_root", handRoot]]);

anim_vault = rh_body_clip(SKEL, RIG, [
    [0.00, nd_trav_key([0, 0.02, -0.06], [3, 0, -10], [5, 0, 8], [0.13, -0.08, 12, 0], [-0.15, 0.17, -28, 0],
                       [[0.20, -0.30, 0.55], [-90, 0, 0]])],
    [0.16, nd_trav_key([0.02, 0.04, -0.14], [14, -8, -20], [30, 0, 10], [0.16, -0.10, 16, 10, 0.34],
                       [-0.10, 0.14, -20, 30, 0.10], [[0.18, -0.50, 0.85], [-80, 0, 0]])],
    [0.32, nd_trav_key([-0.03, 0.0, 0.06], [-6, 10, 10], [14, 6, 4], [0.20, -0.24, 20, -10, 0.42],
                       [-0.02, -0.06, -10, 20, 0.48], [[0.16, -0.12, 0.90], [-60, 0, 0]])],
    [0.52, nd_trav_key([0, 0.02, -0.07], [3, 0, -10], [6, 0, 8], [0.13, -0.08, 12, 0], [-0.15, 0.17, -28, 0],
                       undef)]
], false);

anim_climb_up = rh_body_clip(SKEL, RIG, [
    [0.00, nd_trav_key([0, 0.02, -0.06], [3, 0, -10], [5, 0, 8], [0.13, -0.08, 12, 0], [-0.15, 0.17, -28, 0],
                       [[0.18, -0.35, 1.10], [-150, 0, 0]])],
    [0.22, nd_trav_key([0, 0.06, -0.10], [10, 0, -12], [24, 0, 8], [0.15, -0.20, 14, 20, 0.40],
                       [-0.14, 0.18, -24, 20, 0.04], [[0.18, -0.36, 1.25], [-140, 0, 0]])],
    [0.52, nd_trav_key([0, 0.08, -0.28], [20, 0, -10], [36, 0, 6], [0.14, -0.22, 14, 0, 0.0],
                       [-0.13, 0.06, -20, 30, 0.30], [[0.16, -0.30, 0.60], [-110, 0, 0]])],
    [0.86, nd_trav_key([0, 0.02, -0.06], [3, 0, -10], [5, 0, 8], [0.13, -0.08, 12, 0], [-0.15, 0.17, -28, 0],
                       undef)]
], false);

// --- Interaction ---------------------------------------------------------------
// Drop to a knee, reach the ground with the support hand, rifle held low.

anim_loot_ground = rh_body_clip(SKEL, RIG, [
    [0.00, nd_trav_key([0, 0.02, -0.06], [3, 0, -10], [5, 0, 8], [0.13, -0.08, 12, 0], [-0.15, 0.17, -28, 0],
                       undef)],
    [0.18, nd_trav_key([0, 0.06, -0.22], [8, 0, -10], [18, 0, 6], [0.14, -0.12, 12, 0], [-0.15, 0.18, -26, 20],
                       [[0.16, -0.40, 0.30], [-60, 0, 10]])],
    [0.34, nd_trav_key([0.02, 0.10, -0.44], [14, -4, -12], [34, 0, 4], [0.15, -0.20, 14, 0],
                       [-0.15, 0.22, -26, 48], [[0.14, -0.52, 0.06], [-30, 0, 20]])],
    [0.62, nd_trav_key([0.02, 0.10, -0.44], [14, -4, -12], [32, 0, 4], [0.15, -0.20, 14, 0],
                       [-0.15, 0.22, -26, 48], [[0.12, -0.36, 0.20], [-50, 0, 20]])],
    [0.76, nd_trav_key([0, 0.06, -0.20], [8, 0, -10], [16, 0, 6], [0.14, -0.12, 12, 0], [-0.15, 0.18, -26, 20],
                       undef)],
    [0.90, nd_trav_key([0, 0.02, -0.06], [3, 0, -10], [5, 0, 8], [0.13, -0.08, 12, 0], [-0.15, 0.17, -28, 0],
                       undef)]
], false);
